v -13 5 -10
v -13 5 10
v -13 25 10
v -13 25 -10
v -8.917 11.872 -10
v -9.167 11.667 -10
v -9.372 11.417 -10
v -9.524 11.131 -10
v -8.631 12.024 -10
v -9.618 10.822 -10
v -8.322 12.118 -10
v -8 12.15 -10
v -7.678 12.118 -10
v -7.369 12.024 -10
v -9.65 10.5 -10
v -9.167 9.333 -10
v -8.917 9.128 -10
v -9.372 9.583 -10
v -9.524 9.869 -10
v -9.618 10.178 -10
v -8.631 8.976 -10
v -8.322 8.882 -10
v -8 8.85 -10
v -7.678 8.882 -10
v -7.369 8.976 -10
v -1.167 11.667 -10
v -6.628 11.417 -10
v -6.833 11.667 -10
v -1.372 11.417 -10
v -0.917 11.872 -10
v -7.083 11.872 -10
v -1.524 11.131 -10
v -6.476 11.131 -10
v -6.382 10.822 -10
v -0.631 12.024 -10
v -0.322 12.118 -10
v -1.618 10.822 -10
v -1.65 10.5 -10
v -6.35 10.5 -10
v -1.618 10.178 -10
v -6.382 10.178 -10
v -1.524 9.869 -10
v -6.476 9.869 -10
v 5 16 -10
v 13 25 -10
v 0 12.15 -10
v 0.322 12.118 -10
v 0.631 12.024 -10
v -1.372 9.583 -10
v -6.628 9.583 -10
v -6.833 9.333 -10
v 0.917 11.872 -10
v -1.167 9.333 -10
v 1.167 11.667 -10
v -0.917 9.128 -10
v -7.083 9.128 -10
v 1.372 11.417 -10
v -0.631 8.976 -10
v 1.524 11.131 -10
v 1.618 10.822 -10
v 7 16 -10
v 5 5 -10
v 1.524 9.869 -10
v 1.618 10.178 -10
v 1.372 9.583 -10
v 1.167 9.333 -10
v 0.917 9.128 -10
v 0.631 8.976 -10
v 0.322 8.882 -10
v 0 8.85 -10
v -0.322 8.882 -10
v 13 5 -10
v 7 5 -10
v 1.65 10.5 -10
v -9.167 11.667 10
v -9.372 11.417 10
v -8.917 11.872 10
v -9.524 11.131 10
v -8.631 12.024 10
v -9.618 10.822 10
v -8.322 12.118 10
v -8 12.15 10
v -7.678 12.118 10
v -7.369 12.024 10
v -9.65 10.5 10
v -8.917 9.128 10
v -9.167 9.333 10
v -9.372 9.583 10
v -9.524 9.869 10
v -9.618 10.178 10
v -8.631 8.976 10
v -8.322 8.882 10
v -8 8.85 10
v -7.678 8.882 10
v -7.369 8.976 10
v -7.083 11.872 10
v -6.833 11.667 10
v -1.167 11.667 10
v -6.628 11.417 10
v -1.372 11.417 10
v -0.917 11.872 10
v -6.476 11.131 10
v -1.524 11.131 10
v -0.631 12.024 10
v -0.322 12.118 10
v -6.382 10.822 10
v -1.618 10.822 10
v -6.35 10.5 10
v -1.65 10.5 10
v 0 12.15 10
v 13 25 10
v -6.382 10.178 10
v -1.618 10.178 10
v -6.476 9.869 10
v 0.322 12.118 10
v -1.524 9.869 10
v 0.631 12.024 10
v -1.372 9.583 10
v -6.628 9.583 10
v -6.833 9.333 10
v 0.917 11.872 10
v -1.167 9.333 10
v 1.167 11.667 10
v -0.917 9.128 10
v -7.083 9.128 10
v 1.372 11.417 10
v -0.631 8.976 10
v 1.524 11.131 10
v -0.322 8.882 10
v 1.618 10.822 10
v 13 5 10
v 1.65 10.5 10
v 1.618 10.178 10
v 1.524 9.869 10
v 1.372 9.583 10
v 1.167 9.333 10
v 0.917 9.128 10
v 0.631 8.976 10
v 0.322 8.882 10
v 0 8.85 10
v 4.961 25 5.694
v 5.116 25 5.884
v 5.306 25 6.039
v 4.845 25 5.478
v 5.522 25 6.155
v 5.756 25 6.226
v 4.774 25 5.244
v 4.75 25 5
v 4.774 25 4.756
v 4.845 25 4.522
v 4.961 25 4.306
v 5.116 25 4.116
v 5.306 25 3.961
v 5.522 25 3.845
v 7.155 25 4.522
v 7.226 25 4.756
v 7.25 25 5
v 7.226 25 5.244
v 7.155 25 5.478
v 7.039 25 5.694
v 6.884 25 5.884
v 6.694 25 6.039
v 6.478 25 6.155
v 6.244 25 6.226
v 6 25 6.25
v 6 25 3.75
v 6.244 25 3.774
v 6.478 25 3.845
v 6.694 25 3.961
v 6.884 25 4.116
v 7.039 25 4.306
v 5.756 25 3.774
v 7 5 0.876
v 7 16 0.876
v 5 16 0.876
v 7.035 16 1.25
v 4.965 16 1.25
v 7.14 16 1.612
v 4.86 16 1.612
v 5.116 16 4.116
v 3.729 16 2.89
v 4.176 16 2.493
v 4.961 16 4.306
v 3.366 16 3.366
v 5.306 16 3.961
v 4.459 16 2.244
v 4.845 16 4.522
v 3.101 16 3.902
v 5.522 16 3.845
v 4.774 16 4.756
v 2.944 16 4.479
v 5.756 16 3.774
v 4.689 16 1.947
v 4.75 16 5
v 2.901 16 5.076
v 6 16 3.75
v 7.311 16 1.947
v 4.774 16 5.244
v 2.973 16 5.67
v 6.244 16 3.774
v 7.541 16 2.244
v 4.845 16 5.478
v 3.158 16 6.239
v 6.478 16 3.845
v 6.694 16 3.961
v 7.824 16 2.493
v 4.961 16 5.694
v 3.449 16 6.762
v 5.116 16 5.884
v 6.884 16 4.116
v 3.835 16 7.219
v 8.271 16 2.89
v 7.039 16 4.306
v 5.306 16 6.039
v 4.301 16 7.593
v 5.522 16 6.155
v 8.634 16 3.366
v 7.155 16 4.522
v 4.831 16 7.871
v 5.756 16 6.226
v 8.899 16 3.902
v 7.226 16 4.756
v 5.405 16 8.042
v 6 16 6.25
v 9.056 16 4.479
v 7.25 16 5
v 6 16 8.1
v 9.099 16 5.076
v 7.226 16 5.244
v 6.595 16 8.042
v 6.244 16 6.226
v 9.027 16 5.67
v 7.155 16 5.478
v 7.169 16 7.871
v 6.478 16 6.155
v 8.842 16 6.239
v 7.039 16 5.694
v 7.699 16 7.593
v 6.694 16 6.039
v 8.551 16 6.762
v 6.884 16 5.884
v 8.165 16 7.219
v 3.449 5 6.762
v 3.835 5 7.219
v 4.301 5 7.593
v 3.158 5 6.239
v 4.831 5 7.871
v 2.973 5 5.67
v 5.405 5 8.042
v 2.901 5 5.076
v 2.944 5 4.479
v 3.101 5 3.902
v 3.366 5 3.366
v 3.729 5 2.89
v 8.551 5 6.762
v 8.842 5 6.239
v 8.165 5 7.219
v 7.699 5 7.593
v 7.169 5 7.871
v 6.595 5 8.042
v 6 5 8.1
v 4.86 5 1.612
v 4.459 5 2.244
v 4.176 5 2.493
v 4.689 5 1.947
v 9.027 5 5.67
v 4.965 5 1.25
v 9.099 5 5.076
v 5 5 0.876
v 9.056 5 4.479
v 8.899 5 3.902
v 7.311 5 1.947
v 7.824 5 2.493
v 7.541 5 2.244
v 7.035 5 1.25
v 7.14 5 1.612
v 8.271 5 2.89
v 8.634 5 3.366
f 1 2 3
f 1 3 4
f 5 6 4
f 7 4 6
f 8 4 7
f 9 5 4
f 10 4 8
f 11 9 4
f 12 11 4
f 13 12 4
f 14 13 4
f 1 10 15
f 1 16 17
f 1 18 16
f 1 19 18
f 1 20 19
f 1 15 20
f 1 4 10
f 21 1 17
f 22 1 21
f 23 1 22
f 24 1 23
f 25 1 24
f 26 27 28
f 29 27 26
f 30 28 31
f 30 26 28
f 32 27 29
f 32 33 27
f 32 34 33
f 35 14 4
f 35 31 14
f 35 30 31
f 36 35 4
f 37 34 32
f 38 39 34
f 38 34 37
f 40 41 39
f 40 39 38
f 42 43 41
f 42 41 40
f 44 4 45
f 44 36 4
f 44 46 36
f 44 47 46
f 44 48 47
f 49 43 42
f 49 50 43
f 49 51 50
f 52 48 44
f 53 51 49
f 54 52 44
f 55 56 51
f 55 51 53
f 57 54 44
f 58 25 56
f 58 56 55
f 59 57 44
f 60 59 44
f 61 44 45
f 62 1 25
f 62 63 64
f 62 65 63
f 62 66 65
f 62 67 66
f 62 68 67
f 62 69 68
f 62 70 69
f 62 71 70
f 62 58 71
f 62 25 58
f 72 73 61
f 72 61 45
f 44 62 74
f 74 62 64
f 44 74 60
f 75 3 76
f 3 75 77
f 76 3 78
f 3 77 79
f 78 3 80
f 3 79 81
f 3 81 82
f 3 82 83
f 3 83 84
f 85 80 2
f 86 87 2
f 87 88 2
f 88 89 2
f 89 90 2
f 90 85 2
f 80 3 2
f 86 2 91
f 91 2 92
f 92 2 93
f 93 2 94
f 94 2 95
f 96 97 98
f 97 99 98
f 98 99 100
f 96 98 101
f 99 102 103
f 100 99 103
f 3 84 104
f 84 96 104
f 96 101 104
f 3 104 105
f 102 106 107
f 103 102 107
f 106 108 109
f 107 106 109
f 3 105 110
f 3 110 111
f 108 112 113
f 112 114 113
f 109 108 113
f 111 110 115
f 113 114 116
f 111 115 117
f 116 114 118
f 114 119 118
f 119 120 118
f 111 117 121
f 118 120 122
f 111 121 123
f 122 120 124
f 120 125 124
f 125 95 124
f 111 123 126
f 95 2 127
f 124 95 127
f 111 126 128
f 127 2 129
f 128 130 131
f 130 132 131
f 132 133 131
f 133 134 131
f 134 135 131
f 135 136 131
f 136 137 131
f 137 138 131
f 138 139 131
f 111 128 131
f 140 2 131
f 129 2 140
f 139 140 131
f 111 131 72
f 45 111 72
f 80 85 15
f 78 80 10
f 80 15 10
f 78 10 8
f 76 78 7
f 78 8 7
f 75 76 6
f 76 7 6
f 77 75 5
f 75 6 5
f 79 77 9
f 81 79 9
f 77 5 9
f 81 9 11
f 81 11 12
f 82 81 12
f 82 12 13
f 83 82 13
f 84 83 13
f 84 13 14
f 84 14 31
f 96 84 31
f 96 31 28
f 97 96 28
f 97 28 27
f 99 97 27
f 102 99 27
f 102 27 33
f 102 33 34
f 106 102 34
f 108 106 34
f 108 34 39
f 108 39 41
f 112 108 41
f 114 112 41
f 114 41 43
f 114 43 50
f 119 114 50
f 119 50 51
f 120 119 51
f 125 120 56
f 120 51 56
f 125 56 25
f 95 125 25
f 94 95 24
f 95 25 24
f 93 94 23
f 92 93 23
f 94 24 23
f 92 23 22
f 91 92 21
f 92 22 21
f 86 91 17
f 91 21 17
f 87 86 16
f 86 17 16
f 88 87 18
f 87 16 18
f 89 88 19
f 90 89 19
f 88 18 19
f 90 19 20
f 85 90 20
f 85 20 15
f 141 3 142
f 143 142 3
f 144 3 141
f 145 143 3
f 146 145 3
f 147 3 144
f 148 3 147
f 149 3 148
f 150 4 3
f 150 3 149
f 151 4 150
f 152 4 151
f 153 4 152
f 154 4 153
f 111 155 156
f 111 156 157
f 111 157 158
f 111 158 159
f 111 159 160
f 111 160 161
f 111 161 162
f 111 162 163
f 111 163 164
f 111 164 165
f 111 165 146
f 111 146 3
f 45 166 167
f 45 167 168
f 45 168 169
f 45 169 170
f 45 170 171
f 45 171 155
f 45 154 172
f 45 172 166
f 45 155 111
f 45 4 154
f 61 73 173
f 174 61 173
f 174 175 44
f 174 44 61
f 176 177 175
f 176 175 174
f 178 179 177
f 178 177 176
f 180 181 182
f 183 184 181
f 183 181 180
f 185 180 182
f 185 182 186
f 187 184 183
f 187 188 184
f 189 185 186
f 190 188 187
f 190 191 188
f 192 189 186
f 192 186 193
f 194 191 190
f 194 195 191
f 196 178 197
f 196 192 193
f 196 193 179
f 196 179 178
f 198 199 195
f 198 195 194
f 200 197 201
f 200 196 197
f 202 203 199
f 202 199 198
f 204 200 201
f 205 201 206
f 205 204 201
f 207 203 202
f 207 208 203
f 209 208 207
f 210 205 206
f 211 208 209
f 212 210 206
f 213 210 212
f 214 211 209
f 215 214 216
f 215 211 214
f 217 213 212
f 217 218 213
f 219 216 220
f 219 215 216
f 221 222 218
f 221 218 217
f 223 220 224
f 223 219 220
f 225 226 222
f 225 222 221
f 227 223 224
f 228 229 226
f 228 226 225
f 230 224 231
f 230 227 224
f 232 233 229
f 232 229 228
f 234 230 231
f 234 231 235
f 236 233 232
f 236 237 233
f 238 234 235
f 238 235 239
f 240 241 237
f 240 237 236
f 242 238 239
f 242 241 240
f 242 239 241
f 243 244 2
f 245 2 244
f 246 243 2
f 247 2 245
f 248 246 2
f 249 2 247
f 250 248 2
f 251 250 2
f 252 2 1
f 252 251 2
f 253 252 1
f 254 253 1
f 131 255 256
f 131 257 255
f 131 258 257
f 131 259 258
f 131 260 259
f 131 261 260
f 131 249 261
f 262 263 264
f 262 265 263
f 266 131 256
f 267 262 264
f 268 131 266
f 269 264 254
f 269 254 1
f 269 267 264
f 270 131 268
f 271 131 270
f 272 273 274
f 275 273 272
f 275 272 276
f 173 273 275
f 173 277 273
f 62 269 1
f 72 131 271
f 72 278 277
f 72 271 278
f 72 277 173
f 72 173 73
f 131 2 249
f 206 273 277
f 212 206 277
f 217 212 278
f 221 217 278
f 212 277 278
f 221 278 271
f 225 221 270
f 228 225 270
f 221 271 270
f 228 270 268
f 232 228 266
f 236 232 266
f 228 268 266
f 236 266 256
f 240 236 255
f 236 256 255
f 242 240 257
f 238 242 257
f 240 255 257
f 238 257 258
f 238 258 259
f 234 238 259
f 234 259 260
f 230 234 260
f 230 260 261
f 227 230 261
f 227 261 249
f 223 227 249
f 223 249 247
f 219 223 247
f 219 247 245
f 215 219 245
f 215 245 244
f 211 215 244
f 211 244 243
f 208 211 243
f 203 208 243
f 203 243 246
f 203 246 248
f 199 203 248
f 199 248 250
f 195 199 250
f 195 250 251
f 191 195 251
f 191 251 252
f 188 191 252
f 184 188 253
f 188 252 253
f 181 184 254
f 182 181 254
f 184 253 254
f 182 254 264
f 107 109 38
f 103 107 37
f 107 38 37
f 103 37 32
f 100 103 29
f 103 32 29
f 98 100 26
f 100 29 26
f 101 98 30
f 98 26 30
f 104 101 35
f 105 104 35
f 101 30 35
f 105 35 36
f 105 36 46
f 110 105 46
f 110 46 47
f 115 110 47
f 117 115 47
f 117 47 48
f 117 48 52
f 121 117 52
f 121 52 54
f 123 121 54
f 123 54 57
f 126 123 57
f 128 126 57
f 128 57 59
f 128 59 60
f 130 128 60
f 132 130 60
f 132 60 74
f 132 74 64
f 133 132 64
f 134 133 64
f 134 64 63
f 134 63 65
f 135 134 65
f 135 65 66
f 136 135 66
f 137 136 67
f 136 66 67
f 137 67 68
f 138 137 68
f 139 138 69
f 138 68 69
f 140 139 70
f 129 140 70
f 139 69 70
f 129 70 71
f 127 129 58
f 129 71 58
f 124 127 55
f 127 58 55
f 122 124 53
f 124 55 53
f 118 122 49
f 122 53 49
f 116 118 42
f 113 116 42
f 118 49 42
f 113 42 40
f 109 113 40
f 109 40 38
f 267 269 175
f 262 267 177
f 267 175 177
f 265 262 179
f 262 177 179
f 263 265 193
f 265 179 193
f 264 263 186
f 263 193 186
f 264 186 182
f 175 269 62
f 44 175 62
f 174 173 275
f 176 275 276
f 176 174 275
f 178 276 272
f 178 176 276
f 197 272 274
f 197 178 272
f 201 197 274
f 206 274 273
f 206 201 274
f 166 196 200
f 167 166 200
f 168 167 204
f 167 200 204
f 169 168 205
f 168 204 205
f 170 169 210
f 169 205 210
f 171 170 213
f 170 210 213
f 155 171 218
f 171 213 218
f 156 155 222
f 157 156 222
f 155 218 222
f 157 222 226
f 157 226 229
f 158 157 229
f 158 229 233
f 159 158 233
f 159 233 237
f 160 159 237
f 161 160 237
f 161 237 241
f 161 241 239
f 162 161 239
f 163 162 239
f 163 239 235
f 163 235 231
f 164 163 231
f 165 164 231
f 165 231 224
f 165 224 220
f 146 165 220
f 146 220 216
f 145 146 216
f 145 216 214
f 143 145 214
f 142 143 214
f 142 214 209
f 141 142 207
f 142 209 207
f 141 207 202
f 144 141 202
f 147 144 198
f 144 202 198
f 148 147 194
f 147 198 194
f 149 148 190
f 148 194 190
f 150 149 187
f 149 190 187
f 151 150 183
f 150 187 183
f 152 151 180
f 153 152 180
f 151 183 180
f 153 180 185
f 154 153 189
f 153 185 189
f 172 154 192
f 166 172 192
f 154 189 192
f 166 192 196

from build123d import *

# Parameters (mm, degrees)
SKETCH_1_W          = 26
SKETCH_1_H          = 20
EXTRUDE_1_DEPTH     = 25
CUT_EXTRUDE_1_DEPTH = 16
FILLET_1_R          = 2
SKETCH_3_R          = 1.25
CUT_EXTRUDE_2_DEPTH = 23.912878475
SKETCH_4_R          = 1.65
CUT_EXTRUDE_3_DEPTH = 35.554305086
SKETCH_5_W          = 20
SKETCH_5_H          = 5
CUT_EXTRUDE_4_DEPTH = 38.429934544


with BuildPart() as part:
    # 草图1 → 凸台-拉伸1 (new body)
    with BuildSketch(Plane(origin=(0, 0, 0), x_dir=(1, 0, 0), z_dir=(0, 1, 0))):
        Rectangle(SKETCH_1_W, SKETCH_1_H)
    extrude(amount=EXTRUDE_1_DEPTH)

    # 草图2 → 切除-拉伸1 (cut)
    with BuildSketch(Plane.XZ):
        with BuildLine():
            Line((5, 2.06571985), (5, -10))
            Line((5, -10), (7, -10))
            Line((7, -10), (7, 2.06571985))
            ThreePointArc((7, 2.06571985), (6, 8.1), (5, 2.06571985))
        make_face()
    extrude(amount=-CUT_EXTRUDE_1_DEPTH, mode=Mode.SUBTRACT)

    # 圆角1
    fillet_1_edges = [part.edges().sort_by_distance(p)[0] for p in [
        (5, 8, 2.06571985),
        (7, 8, 2.06571985),
    ]]
    fillet(fillet_1_edges, radius=FILLET_1_R)

    # 草图3 → 切除-拉伸2 (cut, through all)
    with BuildSketch(Plane.XZ.offset(-16)):
        with Locations(Location((6, 5, 0), (0, 0, 270))):
            Circle(SKETCH_3_R)
    extrude(amount=-CUT_EXTRUDE_2_DEPTH, mode=Mode.SUBTRACT)

    # 草图4 → 切除-拉伸3 (cut, through all)
    with BuildSketch(Plane(origin=(0, 0, -10), x_dir=(-1, 0, 0), z_dir=(0, 0, -1))):
        with Locations((8, 10.5)):
            Circle(SKETCH_4_R)
        with Locations((0, 10.5)):
            Circle(SKETCH_4_R)
    extrude(amount=-CUT_EXTRUDE_3_DEPTH, mode=Mode.SUBTRACT)

    # 草图5 → 切除-拉伸4 (cut, through all)
    with BuildSketch(Plane(origin=(13, 0, 0), x_dir=(0, 0, -1), z_dir=(1, 0, 0))):
        with Locations((0, 2.5)):
            Rectangle(SKETCH_5_W, SKETCH_5_H)
    extrude(amount=-CUT_EXTRUDE_4_DEPTH, mode=Mode.SUBTRACT)


solid = part.part
